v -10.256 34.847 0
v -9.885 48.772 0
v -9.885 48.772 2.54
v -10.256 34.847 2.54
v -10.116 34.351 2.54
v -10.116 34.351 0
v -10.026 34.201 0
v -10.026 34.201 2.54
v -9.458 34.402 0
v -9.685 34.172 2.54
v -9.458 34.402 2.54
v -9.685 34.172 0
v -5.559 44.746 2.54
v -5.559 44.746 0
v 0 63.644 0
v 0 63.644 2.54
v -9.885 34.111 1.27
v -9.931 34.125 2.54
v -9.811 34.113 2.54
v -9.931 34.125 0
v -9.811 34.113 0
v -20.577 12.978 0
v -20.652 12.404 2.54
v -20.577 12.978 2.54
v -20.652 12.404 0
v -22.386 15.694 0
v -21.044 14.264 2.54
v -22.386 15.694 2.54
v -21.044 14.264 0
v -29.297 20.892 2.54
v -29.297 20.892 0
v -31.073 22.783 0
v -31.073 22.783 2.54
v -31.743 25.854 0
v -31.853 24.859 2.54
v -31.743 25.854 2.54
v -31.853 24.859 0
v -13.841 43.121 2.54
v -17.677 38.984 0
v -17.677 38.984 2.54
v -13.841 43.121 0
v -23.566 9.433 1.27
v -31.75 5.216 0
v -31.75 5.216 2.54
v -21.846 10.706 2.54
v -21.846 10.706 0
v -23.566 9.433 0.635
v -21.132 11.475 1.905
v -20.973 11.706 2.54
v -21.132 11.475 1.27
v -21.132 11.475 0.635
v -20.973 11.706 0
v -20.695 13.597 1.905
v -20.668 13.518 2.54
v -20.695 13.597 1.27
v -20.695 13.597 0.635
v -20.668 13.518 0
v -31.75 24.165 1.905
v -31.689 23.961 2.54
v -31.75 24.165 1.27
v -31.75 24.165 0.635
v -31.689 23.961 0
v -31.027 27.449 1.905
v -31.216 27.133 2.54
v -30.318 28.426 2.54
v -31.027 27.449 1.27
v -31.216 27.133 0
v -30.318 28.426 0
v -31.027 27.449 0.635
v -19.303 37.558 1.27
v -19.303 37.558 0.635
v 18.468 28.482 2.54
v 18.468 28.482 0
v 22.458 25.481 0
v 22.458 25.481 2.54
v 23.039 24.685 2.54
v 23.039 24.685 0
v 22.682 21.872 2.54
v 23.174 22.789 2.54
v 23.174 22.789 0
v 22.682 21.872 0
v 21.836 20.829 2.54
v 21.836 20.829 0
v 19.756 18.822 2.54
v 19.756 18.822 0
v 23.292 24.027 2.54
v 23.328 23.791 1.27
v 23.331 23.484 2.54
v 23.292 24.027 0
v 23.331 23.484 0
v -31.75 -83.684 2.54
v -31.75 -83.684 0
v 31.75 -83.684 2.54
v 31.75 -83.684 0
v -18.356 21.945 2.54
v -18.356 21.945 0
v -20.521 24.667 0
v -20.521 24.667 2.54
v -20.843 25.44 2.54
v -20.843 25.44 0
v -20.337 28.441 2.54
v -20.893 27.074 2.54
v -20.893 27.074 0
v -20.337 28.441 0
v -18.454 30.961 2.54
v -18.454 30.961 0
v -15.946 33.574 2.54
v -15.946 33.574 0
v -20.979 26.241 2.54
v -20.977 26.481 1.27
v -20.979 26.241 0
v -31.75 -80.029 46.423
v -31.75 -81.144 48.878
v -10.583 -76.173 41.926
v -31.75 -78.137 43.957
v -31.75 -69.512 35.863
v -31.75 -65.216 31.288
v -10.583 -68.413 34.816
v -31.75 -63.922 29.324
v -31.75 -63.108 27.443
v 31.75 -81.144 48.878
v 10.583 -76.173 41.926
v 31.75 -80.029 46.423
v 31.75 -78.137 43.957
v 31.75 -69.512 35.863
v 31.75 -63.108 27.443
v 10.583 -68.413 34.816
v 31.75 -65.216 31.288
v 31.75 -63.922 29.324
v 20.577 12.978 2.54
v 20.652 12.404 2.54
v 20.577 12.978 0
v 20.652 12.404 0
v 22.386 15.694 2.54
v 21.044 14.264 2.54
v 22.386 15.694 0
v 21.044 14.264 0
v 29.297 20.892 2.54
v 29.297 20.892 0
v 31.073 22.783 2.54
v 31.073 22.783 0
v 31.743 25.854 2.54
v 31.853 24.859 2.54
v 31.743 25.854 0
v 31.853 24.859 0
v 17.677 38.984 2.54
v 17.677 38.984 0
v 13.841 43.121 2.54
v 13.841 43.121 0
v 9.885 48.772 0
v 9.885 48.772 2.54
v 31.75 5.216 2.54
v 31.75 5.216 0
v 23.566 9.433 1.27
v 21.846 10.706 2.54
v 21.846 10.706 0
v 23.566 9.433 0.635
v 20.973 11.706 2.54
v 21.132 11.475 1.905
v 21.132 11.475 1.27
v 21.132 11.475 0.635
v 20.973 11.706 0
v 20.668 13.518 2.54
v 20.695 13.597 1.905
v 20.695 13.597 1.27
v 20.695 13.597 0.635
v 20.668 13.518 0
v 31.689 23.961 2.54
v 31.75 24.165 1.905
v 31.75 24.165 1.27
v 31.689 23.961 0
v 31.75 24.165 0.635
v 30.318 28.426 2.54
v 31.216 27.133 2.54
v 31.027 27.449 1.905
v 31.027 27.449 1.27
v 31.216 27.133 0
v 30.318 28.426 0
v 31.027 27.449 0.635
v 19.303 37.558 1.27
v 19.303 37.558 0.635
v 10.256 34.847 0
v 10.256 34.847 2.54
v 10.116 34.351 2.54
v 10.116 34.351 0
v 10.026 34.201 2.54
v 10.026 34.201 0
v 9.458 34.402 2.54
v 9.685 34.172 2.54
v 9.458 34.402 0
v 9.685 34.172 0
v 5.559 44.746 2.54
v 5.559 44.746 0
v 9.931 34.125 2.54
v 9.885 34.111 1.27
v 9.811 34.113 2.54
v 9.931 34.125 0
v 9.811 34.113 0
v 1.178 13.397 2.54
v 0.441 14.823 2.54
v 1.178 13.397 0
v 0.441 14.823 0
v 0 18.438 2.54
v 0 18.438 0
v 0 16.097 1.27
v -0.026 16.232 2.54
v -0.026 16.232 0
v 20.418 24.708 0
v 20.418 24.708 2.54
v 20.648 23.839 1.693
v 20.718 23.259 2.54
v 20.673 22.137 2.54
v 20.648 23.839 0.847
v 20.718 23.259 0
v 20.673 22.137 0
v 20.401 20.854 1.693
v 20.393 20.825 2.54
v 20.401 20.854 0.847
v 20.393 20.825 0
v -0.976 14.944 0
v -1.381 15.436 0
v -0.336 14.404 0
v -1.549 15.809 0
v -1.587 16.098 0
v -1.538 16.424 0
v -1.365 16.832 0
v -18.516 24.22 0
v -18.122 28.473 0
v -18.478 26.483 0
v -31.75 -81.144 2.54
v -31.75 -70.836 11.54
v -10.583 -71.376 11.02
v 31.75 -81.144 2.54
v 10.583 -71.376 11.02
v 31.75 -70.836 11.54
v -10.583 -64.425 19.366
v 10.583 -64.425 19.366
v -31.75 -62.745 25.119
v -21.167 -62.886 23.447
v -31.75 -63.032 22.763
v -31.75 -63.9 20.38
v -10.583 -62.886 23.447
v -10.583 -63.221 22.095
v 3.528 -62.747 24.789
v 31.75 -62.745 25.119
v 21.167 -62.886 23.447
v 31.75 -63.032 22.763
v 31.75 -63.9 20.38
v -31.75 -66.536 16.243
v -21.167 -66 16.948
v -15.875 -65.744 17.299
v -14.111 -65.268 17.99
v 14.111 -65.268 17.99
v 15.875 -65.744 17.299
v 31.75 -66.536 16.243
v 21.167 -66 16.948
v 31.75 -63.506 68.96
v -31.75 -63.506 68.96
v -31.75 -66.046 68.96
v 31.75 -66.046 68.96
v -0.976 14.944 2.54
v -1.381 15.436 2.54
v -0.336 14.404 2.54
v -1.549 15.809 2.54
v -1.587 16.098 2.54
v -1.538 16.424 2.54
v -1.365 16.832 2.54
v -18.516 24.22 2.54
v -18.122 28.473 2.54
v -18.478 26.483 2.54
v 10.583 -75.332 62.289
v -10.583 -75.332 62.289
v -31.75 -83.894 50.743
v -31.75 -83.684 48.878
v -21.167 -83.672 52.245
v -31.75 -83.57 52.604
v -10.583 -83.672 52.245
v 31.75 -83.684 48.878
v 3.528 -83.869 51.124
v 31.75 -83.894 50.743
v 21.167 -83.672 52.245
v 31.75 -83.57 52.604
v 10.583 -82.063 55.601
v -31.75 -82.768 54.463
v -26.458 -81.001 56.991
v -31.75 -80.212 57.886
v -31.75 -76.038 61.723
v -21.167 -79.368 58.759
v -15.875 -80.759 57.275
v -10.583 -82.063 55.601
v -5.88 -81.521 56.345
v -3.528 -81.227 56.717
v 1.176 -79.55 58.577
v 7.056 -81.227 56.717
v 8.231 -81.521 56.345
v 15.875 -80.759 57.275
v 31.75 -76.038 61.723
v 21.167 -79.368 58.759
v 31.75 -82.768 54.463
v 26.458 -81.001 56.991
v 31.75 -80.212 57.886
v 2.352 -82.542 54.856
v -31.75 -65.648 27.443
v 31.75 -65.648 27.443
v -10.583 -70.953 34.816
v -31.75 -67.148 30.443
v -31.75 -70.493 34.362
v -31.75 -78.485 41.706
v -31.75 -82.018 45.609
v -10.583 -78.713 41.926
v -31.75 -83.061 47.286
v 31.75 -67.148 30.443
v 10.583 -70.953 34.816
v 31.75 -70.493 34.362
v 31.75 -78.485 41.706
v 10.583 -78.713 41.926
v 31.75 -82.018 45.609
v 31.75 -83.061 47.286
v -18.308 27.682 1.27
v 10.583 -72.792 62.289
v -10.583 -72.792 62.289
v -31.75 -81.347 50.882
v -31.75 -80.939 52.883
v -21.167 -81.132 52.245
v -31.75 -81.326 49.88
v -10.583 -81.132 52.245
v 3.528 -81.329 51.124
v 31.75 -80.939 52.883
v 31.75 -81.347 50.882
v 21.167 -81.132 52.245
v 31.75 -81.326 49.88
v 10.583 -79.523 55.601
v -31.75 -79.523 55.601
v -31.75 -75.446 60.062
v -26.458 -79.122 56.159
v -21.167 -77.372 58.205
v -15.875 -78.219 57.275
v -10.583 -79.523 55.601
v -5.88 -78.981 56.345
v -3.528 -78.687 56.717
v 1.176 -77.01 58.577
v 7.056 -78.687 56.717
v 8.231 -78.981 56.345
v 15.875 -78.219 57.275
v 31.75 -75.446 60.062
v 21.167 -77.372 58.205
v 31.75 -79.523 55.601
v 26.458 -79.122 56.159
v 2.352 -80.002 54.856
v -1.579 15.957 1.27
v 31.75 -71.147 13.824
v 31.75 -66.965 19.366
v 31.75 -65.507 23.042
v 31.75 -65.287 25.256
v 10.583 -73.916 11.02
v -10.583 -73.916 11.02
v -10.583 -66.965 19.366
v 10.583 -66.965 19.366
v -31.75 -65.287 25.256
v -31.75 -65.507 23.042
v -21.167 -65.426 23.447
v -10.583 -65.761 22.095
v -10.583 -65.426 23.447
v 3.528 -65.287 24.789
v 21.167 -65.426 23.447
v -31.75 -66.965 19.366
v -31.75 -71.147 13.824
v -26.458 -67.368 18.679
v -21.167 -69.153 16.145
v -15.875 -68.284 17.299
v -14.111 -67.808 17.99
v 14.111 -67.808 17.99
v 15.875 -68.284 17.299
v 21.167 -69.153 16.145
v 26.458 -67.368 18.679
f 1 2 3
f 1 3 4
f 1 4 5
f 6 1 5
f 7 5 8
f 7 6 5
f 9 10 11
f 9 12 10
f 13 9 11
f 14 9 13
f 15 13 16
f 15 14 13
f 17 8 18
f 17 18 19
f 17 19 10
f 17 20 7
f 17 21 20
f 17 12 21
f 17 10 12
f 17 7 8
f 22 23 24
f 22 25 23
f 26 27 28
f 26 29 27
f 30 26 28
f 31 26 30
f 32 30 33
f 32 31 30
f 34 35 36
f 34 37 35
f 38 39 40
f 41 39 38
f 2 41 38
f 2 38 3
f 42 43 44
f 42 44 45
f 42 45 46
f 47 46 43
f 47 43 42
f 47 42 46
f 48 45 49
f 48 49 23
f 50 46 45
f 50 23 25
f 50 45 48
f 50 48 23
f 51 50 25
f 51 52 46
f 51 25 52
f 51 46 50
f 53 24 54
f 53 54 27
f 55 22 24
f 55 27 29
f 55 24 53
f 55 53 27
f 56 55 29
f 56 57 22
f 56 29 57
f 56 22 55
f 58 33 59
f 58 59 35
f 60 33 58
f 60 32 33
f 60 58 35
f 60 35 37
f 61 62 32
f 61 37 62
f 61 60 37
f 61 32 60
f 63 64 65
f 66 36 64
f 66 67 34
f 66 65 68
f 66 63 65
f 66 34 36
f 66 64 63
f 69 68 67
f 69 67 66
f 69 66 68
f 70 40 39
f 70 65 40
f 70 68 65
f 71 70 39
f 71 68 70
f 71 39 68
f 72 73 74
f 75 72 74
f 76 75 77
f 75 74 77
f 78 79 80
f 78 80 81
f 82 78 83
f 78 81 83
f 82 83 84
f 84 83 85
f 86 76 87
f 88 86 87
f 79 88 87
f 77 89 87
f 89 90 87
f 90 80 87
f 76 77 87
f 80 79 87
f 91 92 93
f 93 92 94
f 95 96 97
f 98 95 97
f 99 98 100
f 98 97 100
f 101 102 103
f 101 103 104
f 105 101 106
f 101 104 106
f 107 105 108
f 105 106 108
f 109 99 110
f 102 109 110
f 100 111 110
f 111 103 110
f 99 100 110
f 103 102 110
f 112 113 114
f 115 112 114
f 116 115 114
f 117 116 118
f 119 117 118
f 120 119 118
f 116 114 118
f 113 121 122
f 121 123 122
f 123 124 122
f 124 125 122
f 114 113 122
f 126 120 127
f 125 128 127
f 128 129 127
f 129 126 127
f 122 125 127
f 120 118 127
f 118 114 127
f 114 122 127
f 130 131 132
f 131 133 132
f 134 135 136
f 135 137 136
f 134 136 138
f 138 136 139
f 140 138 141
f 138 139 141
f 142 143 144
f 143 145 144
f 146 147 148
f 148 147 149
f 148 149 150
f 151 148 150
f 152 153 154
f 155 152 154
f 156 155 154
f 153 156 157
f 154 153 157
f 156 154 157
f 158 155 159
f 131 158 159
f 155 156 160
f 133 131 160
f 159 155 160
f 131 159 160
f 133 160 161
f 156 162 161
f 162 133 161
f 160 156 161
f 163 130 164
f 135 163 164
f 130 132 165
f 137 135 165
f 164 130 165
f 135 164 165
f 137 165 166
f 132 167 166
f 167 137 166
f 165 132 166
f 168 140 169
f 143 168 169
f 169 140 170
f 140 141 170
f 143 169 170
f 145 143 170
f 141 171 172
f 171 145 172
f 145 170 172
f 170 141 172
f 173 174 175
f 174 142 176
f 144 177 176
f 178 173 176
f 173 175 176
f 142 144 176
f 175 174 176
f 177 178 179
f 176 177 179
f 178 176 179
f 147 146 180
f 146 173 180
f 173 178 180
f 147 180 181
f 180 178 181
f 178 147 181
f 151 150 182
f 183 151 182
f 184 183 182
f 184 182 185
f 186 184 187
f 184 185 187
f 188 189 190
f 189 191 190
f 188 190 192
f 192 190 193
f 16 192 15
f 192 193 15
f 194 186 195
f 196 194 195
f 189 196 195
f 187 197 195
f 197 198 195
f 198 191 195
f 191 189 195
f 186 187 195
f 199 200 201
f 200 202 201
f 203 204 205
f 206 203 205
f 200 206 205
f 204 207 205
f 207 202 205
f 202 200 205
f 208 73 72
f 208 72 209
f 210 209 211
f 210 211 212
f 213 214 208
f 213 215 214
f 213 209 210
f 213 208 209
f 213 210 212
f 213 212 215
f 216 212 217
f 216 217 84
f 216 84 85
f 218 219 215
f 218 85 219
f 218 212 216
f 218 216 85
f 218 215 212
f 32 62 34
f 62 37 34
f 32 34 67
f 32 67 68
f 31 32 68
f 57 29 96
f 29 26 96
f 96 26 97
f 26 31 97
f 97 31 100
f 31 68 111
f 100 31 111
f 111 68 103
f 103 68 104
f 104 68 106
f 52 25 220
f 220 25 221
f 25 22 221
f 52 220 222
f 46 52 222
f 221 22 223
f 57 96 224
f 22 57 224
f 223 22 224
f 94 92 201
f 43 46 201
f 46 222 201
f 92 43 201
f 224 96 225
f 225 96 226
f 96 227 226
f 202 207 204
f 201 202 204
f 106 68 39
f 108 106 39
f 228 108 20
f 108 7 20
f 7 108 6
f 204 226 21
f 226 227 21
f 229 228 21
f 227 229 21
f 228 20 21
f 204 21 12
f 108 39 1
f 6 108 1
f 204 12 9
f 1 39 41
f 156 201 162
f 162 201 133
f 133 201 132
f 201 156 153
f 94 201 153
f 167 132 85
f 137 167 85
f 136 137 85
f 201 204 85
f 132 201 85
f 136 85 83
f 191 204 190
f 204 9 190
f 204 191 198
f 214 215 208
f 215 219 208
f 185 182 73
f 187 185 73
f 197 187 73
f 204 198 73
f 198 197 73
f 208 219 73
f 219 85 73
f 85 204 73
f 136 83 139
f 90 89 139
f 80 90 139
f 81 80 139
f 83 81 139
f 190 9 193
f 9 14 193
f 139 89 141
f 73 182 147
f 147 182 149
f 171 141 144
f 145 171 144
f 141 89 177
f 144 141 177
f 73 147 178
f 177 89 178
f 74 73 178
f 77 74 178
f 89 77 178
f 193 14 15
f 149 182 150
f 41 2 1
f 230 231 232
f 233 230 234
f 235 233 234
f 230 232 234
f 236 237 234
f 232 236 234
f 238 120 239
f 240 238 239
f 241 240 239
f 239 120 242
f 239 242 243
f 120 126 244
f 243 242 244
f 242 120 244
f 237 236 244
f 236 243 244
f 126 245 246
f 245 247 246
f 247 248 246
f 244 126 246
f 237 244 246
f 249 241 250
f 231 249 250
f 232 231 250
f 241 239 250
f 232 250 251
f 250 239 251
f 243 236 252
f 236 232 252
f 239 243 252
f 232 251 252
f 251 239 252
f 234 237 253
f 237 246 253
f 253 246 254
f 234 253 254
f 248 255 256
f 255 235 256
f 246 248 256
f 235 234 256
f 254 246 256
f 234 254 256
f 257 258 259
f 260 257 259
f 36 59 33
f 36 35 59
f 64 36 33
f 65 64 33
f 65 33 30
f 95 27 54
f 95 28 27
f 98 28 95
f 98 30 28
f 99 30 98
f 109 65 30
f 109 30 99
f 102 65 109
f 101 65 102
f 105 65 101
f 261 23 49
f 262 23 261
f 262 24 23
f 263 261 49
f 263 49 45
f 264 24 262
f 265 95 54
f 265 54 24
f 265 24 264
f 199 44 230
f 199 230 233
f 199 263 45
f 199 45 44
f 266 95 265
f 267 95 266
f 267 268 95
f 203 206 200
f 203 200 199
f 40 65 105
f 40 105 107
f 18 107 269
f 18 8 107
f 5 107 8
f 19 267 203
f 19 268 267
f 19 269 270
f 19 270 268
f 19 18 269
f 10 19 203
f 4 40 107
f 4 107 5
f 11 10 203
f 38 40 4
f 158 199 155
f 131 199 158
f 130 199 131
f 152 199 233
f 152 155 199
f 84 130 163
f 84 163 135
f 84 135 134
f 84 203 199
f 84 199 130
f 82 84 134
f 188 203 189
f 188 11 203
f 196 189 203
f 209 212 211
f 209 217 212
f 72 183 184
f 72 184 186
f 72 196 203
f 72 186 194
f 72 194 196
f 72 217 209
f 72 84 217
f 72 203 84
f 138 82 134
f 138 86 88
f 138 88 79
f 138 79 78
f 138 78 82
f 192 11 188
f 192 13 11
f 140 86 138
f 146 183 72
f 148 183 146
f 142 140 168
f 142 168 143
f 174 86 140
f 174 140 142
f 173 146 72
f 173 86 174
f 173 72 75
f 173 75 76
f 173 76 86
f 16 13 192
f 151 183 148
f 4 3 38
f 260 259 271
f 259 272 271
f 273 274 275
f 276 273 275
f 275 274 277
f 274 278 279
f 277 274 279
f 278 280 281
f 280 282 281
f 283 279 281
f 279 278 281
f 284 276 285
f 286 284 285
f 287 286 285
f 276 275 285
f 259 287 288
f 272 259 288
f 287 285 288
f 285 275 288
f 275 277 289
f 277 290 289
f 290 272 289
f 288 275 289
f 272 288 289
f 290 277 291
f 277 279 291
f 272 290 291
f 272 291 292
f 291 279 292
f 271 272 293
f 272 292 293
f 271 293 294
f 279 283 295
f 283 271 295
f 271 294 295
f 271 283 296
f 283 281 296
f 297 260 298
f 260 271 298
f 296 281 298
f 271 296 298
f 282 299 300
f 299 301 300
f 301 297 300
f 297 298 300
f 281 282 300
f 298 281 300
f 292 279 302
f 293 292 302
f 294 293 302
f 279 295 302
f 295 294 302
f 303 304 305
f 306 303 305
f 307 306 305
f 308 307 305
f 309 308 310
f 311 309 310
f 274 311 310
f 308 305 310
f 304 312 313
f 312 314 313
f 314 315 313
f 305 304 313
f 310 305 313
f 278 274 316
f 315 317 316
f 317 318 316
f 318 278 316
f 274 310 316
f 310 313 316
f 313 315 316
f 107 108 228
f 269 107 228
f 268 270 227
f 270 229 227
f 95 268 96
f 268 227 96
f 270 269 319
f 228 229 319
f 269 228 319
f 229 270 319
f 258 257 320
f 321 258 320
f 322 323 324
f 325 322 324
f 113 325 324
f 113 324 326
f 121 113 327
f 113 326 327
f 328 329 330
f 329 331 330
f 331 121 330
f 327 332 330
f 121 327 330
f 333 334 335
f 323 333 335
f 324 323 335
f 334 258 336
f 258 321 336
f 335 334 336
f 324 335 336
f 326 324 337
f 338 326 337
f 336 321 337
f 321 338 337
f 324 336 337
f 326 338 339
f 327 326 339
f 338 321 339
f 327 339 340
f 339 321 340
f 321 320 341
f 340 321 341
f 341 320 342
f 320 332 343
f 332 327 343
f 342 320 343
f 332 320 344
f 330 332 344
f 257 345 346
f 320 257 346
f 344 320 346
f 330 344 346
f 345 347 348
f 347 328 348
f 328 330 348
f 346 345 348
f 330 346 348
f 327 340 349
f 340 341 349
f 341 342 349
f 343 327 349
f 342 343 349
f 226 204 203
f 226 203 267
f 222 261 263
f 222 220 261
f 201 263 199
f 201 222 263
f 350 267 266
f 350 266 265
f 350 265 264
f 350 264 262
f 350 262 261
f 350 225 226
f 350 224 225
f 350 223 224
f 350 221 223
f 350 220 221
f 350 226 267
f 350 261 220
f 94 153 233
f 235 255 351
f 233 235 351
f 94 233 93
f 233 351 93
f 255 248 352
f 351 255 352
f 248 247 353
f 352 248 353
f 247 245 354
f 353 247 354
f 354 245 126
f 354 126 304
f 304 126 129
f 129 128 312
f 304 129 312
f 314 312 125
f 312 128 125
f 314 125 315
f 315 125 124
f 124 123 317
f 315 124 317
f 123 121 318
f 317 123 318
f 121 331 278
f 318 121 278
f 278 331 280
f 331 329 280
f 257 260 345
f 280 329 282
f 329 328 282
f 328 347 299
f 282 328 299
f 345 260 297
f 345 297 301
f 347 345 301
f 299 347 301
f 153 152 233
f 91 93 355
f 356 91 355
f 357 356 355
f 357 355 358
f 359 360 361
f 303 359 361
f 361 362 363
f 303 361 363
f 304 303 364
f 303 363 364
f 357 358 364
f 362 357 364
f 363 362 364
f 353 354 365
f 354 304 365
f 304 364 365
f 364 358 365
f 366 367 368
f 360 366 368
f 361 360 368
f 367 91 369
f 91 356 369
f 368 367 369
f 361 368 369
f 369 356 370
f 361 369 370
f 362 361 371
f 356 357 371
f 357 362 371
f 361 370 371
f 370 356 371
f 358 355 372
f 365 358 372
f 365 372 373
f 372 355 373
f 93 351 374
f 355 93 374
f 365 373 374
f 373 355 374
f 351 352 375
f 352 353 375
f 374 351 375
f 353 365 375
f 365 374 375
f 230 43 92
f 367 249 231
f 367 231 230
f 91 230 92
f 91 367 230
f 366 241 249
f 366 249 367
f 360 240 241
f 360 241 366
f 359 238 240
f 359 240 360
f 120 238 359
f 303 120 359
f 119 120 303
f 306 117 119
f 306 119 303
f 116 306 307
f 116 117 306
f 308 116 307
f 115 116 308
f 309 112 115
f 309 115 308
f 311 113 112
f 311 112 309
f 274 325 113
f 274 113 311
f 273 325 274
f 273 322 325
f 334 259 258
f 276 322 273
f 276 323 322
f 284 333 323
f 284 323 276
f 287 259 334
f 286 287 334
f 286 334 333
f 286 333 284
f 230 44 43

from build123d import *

# Parameters (mm, degrees)
F1_DEPTH = 2.54
F3_DEPTH = 63.5


with BuildPart() as f1:
    # F0 (on Top) → F1 (new body)
    with BuildSketch(Plane.XY):
        with BuildLine():
            Line((-31.75, -83.6839513757), (31.75, -83.6839513778))
            Line((31.75, -83.6839513778), (31.75, 5.2160486222))
            add(Edge.make_bspline(
                [(31.75, 5.2160486243), (25.7086750977, 8.2095040737), (13.2919018227, 13.2612920956), (40.4686708732, 24.151033206), (17.1693446816, 37.3717586227), (12.2441961548, 45.1813499568), (9.8845292789, 48.7718827984)],
                knots=[0, 0, 0, 0, 0.2366640156, 0.4851512444, 0.756842013, 1, 1, 1, 1], degree=3))
            add(Edge.make_bspline(
                [(9.8845292789, 48.7718827984), (10.3444855628, 41.5162894514), (11.4748144078, 23.6858829352), (4.2718916672, 48.7681543781), (0, 63.6438973943)],
                knots=[0, 0, 0, 0, 0.4069224168, 1, 1, 1, 1], degree=3))
            add(Edge.make_bspline(
                [(-9.8845292789, 48.7718827984), (-10.3444855628, 41.5162894514), (-11.4748144078, 23.6858829352), (-4.2718916672, 48.7681543781), (0, 63.6438973943)],
                knots=[0, 0, 0, 0, 0.4069224168, 1, 1, 1, 1], degree=3))
            add(Edge.make_bspline(
                [(-31.75, 5.2160486243), (-25.7086750977, 8.2095040737), (-13.2919018227, 13.2612920956), (-40.4686708732, 24.151033206), (-17.1693446816, 37.3717586227), (-12.2441961548, 45.1813499568), (-9.8845292789, 48.7718827984)],
                knots=[0, 0, 0, 0, 0.2366640156, 0.4851512444, 0.756842013, 1, 1, 1, 1], degree=3))
            Line((-31.75, 5.2160486243), (-31.75, -83.6839513757))
        make_face()
        with BuildLine():
            add(Edge.make_bspline(
                [(0, 18.4377846975), (-0.8402767268, 17.5937250168), (-2.6308980883, 15.7950420042), (-0.1427417595, 14.228570259), (1.1778091829, 13.3971894932)],
                knots=[0, 0, 0, 0, 0.4692654392, 1, 1, 1, 1], degree=3))
            add(Edge.make_bspline(
                [(0, 18.4377846975), (-0.0824907332, 17.6625700732), (-0.2575054179, 16.0178521281), (0.6814285359, 14.3035037553), (1.1778091829, 13.3971894932)],
                knots=[0, 0, 0, 0, 0.471335989, 1, 1, 1, 1], degree=3))
        make_face(mode=Mode.SUBTRACT)
        with BuildLine():
            add(Edge.make_bspline(
                [(-15.9456048132, 33.5736688751), (-16.9306722249, 31.6219338837), (-18.8522437067, 27.8146830449), (-18.5188141617, 23.8680684012), (-18.3563127499, 21.9446315956)],
                knots=[0, 0, 0, 0, 0.5126363558, 1, 1, 1, 1], degree=3))
            add(Edge.make_bspline(
                [(-18.3563127499, 21.9446315956), (-19.7054262057, 23.386298555), (-22.7926148104, 26.6852777417), (-18.411919139, 31.0924491189), (-15.9456048132, 33.5736688751)],
                knots=[0, 0, 0, 0, 0.4370039013, 1, 1, 1, 1], degree=3))
        make_face(mode=Mode.SUBTRACT)
        with BuildLine():
            add(Edge.make_bspline(
                [(18.4678306852, 28.4819673923), (19.427421291, 26.8806889301), (21.1201724035, 24.0559786368), (20.4629903584, 20.881000871), (19.9780060806, 19.4686195152), (19.7560574985, 18.8222556485)],
                knots=[0, 0, 0, 0, 0.4151573771, 0.7323521239, 1, 1, 1, 1], degree=3))
            add(Edge.make_bspline(
                [(18.4678306852, 28.4819673923), (20.8235774768, 26.9635696387), (25.4215767631, 23.9999267161), (21.6132297579, 20.51951007), (19.7560574985, 18.8222556485)],
                knots=[0, 0, 0, 0, 0.5123416723, 1, 1, 1, 1], degree=3))
        make_face(mode=Mode.SUBTRACT)
    extrude(amount=F1_DEPTH)

    # F2 (on face) → F3 (join)
    with BuildSketch(Plane.YZ.offset(31.75)):
        with BuildLine():
            add(Edge.make_bspline(
                [(-65.6484358175, 27.4432951095), (-67.9772508721, 34.9822299474), (-81.8557368461, 41.970962749), (-83.6839513778, 48.8775275409)],
                knots=[0.3464011194, 0.3464011194, 0.3464011194, 0.3464011194, 0.6770339361, 0.6770339361, 0.6770339361, 0.6770339361], degree=3))
            Line((-65.6484358175, 27.4432951095), (-63.1084358175, 27.4432951095))
            add(Edge.make_bspline(
                [(-81.1439513778, 48.8775275409), (-79.3157352707, 41.9709626757), (-65.4372513089, 34.9822301927), (-63.1084358175, 27.4432951095)],
                knots=[0.3229660639, 0.3229660639, 0.3229660639, 0.3229660639, 0.6535988806, 0.6535988806, 0.6535988806, 0.6535988806], degree=3))
            Line((-81.1439513778, 48.8775275409), (-83.6839513778, 48.8775275409))
        make_face()
        with BuildLine():
            add(Edge.make_bspline(
                [(-83.6839513778, 48.8775275409), (-85.4697730551, 55.6239420932), (-75.7576902273, 62.2919550981), (-66.0456140927, 68.9599682055)],
                knots=[0.6770339361, 0.6770339361, 0.6770339361, 0.6770339361, 1, 1, 1, 1], degree=3))
            Line((-83.6839513778, 48.8775275409), (-81.1439513778, 48.8775275409))
            add(Edge.make_bspline(
                [(-63.5056140927, 68.9599682055), (-73.2176967282, 62.2919556151), (-82.929774594, 55.6239421648), (-81.1439513778, 48.8775275409)],
                knots=[0, 0, 0, 0, 0.3229660639, 0.3229660639, 0.3229660639, 0.3229660639], degree=3))
            Line((-63.5056140927, 68.9599682055), (-66.0456140927, 68.9599682055))
        make_face()
        with BuildLine():
            add(Edge.make_bspline(
                [(-83.6839513778, 2.54), (-73.4462547351, 11.0424093805), (-63.2085565888, 19.5448188091), (-65.6484358175, 27.4432951095)],
                knots=[0, 0, 0, 0, 0.3464011194, 0.3464011194, 0.3464011194, 0.3464011194], degree=3))
            Line((-83.6839513778, 2.54), (-81.1439513778, 2.54))
            add(Edge.make_bspline(
                [(-63.1084358175, 27.4432951095), (-60.6685561312, 19.5448185522), (-70.9062511318, 11.0424082477), (-81.1439513778, 2.54)],
                knots=[0.6535988806, 0.6535988806, 0.6535988806, 0.6535988806, 1, 1, 1, 1], degree=3))
            Line((-63.1084358175, 27.4432951095), (-65.6484358175, 27.4432951095))
        make_face()
    extrude(amount=-F3_DEPTH)


solid = f1.part
